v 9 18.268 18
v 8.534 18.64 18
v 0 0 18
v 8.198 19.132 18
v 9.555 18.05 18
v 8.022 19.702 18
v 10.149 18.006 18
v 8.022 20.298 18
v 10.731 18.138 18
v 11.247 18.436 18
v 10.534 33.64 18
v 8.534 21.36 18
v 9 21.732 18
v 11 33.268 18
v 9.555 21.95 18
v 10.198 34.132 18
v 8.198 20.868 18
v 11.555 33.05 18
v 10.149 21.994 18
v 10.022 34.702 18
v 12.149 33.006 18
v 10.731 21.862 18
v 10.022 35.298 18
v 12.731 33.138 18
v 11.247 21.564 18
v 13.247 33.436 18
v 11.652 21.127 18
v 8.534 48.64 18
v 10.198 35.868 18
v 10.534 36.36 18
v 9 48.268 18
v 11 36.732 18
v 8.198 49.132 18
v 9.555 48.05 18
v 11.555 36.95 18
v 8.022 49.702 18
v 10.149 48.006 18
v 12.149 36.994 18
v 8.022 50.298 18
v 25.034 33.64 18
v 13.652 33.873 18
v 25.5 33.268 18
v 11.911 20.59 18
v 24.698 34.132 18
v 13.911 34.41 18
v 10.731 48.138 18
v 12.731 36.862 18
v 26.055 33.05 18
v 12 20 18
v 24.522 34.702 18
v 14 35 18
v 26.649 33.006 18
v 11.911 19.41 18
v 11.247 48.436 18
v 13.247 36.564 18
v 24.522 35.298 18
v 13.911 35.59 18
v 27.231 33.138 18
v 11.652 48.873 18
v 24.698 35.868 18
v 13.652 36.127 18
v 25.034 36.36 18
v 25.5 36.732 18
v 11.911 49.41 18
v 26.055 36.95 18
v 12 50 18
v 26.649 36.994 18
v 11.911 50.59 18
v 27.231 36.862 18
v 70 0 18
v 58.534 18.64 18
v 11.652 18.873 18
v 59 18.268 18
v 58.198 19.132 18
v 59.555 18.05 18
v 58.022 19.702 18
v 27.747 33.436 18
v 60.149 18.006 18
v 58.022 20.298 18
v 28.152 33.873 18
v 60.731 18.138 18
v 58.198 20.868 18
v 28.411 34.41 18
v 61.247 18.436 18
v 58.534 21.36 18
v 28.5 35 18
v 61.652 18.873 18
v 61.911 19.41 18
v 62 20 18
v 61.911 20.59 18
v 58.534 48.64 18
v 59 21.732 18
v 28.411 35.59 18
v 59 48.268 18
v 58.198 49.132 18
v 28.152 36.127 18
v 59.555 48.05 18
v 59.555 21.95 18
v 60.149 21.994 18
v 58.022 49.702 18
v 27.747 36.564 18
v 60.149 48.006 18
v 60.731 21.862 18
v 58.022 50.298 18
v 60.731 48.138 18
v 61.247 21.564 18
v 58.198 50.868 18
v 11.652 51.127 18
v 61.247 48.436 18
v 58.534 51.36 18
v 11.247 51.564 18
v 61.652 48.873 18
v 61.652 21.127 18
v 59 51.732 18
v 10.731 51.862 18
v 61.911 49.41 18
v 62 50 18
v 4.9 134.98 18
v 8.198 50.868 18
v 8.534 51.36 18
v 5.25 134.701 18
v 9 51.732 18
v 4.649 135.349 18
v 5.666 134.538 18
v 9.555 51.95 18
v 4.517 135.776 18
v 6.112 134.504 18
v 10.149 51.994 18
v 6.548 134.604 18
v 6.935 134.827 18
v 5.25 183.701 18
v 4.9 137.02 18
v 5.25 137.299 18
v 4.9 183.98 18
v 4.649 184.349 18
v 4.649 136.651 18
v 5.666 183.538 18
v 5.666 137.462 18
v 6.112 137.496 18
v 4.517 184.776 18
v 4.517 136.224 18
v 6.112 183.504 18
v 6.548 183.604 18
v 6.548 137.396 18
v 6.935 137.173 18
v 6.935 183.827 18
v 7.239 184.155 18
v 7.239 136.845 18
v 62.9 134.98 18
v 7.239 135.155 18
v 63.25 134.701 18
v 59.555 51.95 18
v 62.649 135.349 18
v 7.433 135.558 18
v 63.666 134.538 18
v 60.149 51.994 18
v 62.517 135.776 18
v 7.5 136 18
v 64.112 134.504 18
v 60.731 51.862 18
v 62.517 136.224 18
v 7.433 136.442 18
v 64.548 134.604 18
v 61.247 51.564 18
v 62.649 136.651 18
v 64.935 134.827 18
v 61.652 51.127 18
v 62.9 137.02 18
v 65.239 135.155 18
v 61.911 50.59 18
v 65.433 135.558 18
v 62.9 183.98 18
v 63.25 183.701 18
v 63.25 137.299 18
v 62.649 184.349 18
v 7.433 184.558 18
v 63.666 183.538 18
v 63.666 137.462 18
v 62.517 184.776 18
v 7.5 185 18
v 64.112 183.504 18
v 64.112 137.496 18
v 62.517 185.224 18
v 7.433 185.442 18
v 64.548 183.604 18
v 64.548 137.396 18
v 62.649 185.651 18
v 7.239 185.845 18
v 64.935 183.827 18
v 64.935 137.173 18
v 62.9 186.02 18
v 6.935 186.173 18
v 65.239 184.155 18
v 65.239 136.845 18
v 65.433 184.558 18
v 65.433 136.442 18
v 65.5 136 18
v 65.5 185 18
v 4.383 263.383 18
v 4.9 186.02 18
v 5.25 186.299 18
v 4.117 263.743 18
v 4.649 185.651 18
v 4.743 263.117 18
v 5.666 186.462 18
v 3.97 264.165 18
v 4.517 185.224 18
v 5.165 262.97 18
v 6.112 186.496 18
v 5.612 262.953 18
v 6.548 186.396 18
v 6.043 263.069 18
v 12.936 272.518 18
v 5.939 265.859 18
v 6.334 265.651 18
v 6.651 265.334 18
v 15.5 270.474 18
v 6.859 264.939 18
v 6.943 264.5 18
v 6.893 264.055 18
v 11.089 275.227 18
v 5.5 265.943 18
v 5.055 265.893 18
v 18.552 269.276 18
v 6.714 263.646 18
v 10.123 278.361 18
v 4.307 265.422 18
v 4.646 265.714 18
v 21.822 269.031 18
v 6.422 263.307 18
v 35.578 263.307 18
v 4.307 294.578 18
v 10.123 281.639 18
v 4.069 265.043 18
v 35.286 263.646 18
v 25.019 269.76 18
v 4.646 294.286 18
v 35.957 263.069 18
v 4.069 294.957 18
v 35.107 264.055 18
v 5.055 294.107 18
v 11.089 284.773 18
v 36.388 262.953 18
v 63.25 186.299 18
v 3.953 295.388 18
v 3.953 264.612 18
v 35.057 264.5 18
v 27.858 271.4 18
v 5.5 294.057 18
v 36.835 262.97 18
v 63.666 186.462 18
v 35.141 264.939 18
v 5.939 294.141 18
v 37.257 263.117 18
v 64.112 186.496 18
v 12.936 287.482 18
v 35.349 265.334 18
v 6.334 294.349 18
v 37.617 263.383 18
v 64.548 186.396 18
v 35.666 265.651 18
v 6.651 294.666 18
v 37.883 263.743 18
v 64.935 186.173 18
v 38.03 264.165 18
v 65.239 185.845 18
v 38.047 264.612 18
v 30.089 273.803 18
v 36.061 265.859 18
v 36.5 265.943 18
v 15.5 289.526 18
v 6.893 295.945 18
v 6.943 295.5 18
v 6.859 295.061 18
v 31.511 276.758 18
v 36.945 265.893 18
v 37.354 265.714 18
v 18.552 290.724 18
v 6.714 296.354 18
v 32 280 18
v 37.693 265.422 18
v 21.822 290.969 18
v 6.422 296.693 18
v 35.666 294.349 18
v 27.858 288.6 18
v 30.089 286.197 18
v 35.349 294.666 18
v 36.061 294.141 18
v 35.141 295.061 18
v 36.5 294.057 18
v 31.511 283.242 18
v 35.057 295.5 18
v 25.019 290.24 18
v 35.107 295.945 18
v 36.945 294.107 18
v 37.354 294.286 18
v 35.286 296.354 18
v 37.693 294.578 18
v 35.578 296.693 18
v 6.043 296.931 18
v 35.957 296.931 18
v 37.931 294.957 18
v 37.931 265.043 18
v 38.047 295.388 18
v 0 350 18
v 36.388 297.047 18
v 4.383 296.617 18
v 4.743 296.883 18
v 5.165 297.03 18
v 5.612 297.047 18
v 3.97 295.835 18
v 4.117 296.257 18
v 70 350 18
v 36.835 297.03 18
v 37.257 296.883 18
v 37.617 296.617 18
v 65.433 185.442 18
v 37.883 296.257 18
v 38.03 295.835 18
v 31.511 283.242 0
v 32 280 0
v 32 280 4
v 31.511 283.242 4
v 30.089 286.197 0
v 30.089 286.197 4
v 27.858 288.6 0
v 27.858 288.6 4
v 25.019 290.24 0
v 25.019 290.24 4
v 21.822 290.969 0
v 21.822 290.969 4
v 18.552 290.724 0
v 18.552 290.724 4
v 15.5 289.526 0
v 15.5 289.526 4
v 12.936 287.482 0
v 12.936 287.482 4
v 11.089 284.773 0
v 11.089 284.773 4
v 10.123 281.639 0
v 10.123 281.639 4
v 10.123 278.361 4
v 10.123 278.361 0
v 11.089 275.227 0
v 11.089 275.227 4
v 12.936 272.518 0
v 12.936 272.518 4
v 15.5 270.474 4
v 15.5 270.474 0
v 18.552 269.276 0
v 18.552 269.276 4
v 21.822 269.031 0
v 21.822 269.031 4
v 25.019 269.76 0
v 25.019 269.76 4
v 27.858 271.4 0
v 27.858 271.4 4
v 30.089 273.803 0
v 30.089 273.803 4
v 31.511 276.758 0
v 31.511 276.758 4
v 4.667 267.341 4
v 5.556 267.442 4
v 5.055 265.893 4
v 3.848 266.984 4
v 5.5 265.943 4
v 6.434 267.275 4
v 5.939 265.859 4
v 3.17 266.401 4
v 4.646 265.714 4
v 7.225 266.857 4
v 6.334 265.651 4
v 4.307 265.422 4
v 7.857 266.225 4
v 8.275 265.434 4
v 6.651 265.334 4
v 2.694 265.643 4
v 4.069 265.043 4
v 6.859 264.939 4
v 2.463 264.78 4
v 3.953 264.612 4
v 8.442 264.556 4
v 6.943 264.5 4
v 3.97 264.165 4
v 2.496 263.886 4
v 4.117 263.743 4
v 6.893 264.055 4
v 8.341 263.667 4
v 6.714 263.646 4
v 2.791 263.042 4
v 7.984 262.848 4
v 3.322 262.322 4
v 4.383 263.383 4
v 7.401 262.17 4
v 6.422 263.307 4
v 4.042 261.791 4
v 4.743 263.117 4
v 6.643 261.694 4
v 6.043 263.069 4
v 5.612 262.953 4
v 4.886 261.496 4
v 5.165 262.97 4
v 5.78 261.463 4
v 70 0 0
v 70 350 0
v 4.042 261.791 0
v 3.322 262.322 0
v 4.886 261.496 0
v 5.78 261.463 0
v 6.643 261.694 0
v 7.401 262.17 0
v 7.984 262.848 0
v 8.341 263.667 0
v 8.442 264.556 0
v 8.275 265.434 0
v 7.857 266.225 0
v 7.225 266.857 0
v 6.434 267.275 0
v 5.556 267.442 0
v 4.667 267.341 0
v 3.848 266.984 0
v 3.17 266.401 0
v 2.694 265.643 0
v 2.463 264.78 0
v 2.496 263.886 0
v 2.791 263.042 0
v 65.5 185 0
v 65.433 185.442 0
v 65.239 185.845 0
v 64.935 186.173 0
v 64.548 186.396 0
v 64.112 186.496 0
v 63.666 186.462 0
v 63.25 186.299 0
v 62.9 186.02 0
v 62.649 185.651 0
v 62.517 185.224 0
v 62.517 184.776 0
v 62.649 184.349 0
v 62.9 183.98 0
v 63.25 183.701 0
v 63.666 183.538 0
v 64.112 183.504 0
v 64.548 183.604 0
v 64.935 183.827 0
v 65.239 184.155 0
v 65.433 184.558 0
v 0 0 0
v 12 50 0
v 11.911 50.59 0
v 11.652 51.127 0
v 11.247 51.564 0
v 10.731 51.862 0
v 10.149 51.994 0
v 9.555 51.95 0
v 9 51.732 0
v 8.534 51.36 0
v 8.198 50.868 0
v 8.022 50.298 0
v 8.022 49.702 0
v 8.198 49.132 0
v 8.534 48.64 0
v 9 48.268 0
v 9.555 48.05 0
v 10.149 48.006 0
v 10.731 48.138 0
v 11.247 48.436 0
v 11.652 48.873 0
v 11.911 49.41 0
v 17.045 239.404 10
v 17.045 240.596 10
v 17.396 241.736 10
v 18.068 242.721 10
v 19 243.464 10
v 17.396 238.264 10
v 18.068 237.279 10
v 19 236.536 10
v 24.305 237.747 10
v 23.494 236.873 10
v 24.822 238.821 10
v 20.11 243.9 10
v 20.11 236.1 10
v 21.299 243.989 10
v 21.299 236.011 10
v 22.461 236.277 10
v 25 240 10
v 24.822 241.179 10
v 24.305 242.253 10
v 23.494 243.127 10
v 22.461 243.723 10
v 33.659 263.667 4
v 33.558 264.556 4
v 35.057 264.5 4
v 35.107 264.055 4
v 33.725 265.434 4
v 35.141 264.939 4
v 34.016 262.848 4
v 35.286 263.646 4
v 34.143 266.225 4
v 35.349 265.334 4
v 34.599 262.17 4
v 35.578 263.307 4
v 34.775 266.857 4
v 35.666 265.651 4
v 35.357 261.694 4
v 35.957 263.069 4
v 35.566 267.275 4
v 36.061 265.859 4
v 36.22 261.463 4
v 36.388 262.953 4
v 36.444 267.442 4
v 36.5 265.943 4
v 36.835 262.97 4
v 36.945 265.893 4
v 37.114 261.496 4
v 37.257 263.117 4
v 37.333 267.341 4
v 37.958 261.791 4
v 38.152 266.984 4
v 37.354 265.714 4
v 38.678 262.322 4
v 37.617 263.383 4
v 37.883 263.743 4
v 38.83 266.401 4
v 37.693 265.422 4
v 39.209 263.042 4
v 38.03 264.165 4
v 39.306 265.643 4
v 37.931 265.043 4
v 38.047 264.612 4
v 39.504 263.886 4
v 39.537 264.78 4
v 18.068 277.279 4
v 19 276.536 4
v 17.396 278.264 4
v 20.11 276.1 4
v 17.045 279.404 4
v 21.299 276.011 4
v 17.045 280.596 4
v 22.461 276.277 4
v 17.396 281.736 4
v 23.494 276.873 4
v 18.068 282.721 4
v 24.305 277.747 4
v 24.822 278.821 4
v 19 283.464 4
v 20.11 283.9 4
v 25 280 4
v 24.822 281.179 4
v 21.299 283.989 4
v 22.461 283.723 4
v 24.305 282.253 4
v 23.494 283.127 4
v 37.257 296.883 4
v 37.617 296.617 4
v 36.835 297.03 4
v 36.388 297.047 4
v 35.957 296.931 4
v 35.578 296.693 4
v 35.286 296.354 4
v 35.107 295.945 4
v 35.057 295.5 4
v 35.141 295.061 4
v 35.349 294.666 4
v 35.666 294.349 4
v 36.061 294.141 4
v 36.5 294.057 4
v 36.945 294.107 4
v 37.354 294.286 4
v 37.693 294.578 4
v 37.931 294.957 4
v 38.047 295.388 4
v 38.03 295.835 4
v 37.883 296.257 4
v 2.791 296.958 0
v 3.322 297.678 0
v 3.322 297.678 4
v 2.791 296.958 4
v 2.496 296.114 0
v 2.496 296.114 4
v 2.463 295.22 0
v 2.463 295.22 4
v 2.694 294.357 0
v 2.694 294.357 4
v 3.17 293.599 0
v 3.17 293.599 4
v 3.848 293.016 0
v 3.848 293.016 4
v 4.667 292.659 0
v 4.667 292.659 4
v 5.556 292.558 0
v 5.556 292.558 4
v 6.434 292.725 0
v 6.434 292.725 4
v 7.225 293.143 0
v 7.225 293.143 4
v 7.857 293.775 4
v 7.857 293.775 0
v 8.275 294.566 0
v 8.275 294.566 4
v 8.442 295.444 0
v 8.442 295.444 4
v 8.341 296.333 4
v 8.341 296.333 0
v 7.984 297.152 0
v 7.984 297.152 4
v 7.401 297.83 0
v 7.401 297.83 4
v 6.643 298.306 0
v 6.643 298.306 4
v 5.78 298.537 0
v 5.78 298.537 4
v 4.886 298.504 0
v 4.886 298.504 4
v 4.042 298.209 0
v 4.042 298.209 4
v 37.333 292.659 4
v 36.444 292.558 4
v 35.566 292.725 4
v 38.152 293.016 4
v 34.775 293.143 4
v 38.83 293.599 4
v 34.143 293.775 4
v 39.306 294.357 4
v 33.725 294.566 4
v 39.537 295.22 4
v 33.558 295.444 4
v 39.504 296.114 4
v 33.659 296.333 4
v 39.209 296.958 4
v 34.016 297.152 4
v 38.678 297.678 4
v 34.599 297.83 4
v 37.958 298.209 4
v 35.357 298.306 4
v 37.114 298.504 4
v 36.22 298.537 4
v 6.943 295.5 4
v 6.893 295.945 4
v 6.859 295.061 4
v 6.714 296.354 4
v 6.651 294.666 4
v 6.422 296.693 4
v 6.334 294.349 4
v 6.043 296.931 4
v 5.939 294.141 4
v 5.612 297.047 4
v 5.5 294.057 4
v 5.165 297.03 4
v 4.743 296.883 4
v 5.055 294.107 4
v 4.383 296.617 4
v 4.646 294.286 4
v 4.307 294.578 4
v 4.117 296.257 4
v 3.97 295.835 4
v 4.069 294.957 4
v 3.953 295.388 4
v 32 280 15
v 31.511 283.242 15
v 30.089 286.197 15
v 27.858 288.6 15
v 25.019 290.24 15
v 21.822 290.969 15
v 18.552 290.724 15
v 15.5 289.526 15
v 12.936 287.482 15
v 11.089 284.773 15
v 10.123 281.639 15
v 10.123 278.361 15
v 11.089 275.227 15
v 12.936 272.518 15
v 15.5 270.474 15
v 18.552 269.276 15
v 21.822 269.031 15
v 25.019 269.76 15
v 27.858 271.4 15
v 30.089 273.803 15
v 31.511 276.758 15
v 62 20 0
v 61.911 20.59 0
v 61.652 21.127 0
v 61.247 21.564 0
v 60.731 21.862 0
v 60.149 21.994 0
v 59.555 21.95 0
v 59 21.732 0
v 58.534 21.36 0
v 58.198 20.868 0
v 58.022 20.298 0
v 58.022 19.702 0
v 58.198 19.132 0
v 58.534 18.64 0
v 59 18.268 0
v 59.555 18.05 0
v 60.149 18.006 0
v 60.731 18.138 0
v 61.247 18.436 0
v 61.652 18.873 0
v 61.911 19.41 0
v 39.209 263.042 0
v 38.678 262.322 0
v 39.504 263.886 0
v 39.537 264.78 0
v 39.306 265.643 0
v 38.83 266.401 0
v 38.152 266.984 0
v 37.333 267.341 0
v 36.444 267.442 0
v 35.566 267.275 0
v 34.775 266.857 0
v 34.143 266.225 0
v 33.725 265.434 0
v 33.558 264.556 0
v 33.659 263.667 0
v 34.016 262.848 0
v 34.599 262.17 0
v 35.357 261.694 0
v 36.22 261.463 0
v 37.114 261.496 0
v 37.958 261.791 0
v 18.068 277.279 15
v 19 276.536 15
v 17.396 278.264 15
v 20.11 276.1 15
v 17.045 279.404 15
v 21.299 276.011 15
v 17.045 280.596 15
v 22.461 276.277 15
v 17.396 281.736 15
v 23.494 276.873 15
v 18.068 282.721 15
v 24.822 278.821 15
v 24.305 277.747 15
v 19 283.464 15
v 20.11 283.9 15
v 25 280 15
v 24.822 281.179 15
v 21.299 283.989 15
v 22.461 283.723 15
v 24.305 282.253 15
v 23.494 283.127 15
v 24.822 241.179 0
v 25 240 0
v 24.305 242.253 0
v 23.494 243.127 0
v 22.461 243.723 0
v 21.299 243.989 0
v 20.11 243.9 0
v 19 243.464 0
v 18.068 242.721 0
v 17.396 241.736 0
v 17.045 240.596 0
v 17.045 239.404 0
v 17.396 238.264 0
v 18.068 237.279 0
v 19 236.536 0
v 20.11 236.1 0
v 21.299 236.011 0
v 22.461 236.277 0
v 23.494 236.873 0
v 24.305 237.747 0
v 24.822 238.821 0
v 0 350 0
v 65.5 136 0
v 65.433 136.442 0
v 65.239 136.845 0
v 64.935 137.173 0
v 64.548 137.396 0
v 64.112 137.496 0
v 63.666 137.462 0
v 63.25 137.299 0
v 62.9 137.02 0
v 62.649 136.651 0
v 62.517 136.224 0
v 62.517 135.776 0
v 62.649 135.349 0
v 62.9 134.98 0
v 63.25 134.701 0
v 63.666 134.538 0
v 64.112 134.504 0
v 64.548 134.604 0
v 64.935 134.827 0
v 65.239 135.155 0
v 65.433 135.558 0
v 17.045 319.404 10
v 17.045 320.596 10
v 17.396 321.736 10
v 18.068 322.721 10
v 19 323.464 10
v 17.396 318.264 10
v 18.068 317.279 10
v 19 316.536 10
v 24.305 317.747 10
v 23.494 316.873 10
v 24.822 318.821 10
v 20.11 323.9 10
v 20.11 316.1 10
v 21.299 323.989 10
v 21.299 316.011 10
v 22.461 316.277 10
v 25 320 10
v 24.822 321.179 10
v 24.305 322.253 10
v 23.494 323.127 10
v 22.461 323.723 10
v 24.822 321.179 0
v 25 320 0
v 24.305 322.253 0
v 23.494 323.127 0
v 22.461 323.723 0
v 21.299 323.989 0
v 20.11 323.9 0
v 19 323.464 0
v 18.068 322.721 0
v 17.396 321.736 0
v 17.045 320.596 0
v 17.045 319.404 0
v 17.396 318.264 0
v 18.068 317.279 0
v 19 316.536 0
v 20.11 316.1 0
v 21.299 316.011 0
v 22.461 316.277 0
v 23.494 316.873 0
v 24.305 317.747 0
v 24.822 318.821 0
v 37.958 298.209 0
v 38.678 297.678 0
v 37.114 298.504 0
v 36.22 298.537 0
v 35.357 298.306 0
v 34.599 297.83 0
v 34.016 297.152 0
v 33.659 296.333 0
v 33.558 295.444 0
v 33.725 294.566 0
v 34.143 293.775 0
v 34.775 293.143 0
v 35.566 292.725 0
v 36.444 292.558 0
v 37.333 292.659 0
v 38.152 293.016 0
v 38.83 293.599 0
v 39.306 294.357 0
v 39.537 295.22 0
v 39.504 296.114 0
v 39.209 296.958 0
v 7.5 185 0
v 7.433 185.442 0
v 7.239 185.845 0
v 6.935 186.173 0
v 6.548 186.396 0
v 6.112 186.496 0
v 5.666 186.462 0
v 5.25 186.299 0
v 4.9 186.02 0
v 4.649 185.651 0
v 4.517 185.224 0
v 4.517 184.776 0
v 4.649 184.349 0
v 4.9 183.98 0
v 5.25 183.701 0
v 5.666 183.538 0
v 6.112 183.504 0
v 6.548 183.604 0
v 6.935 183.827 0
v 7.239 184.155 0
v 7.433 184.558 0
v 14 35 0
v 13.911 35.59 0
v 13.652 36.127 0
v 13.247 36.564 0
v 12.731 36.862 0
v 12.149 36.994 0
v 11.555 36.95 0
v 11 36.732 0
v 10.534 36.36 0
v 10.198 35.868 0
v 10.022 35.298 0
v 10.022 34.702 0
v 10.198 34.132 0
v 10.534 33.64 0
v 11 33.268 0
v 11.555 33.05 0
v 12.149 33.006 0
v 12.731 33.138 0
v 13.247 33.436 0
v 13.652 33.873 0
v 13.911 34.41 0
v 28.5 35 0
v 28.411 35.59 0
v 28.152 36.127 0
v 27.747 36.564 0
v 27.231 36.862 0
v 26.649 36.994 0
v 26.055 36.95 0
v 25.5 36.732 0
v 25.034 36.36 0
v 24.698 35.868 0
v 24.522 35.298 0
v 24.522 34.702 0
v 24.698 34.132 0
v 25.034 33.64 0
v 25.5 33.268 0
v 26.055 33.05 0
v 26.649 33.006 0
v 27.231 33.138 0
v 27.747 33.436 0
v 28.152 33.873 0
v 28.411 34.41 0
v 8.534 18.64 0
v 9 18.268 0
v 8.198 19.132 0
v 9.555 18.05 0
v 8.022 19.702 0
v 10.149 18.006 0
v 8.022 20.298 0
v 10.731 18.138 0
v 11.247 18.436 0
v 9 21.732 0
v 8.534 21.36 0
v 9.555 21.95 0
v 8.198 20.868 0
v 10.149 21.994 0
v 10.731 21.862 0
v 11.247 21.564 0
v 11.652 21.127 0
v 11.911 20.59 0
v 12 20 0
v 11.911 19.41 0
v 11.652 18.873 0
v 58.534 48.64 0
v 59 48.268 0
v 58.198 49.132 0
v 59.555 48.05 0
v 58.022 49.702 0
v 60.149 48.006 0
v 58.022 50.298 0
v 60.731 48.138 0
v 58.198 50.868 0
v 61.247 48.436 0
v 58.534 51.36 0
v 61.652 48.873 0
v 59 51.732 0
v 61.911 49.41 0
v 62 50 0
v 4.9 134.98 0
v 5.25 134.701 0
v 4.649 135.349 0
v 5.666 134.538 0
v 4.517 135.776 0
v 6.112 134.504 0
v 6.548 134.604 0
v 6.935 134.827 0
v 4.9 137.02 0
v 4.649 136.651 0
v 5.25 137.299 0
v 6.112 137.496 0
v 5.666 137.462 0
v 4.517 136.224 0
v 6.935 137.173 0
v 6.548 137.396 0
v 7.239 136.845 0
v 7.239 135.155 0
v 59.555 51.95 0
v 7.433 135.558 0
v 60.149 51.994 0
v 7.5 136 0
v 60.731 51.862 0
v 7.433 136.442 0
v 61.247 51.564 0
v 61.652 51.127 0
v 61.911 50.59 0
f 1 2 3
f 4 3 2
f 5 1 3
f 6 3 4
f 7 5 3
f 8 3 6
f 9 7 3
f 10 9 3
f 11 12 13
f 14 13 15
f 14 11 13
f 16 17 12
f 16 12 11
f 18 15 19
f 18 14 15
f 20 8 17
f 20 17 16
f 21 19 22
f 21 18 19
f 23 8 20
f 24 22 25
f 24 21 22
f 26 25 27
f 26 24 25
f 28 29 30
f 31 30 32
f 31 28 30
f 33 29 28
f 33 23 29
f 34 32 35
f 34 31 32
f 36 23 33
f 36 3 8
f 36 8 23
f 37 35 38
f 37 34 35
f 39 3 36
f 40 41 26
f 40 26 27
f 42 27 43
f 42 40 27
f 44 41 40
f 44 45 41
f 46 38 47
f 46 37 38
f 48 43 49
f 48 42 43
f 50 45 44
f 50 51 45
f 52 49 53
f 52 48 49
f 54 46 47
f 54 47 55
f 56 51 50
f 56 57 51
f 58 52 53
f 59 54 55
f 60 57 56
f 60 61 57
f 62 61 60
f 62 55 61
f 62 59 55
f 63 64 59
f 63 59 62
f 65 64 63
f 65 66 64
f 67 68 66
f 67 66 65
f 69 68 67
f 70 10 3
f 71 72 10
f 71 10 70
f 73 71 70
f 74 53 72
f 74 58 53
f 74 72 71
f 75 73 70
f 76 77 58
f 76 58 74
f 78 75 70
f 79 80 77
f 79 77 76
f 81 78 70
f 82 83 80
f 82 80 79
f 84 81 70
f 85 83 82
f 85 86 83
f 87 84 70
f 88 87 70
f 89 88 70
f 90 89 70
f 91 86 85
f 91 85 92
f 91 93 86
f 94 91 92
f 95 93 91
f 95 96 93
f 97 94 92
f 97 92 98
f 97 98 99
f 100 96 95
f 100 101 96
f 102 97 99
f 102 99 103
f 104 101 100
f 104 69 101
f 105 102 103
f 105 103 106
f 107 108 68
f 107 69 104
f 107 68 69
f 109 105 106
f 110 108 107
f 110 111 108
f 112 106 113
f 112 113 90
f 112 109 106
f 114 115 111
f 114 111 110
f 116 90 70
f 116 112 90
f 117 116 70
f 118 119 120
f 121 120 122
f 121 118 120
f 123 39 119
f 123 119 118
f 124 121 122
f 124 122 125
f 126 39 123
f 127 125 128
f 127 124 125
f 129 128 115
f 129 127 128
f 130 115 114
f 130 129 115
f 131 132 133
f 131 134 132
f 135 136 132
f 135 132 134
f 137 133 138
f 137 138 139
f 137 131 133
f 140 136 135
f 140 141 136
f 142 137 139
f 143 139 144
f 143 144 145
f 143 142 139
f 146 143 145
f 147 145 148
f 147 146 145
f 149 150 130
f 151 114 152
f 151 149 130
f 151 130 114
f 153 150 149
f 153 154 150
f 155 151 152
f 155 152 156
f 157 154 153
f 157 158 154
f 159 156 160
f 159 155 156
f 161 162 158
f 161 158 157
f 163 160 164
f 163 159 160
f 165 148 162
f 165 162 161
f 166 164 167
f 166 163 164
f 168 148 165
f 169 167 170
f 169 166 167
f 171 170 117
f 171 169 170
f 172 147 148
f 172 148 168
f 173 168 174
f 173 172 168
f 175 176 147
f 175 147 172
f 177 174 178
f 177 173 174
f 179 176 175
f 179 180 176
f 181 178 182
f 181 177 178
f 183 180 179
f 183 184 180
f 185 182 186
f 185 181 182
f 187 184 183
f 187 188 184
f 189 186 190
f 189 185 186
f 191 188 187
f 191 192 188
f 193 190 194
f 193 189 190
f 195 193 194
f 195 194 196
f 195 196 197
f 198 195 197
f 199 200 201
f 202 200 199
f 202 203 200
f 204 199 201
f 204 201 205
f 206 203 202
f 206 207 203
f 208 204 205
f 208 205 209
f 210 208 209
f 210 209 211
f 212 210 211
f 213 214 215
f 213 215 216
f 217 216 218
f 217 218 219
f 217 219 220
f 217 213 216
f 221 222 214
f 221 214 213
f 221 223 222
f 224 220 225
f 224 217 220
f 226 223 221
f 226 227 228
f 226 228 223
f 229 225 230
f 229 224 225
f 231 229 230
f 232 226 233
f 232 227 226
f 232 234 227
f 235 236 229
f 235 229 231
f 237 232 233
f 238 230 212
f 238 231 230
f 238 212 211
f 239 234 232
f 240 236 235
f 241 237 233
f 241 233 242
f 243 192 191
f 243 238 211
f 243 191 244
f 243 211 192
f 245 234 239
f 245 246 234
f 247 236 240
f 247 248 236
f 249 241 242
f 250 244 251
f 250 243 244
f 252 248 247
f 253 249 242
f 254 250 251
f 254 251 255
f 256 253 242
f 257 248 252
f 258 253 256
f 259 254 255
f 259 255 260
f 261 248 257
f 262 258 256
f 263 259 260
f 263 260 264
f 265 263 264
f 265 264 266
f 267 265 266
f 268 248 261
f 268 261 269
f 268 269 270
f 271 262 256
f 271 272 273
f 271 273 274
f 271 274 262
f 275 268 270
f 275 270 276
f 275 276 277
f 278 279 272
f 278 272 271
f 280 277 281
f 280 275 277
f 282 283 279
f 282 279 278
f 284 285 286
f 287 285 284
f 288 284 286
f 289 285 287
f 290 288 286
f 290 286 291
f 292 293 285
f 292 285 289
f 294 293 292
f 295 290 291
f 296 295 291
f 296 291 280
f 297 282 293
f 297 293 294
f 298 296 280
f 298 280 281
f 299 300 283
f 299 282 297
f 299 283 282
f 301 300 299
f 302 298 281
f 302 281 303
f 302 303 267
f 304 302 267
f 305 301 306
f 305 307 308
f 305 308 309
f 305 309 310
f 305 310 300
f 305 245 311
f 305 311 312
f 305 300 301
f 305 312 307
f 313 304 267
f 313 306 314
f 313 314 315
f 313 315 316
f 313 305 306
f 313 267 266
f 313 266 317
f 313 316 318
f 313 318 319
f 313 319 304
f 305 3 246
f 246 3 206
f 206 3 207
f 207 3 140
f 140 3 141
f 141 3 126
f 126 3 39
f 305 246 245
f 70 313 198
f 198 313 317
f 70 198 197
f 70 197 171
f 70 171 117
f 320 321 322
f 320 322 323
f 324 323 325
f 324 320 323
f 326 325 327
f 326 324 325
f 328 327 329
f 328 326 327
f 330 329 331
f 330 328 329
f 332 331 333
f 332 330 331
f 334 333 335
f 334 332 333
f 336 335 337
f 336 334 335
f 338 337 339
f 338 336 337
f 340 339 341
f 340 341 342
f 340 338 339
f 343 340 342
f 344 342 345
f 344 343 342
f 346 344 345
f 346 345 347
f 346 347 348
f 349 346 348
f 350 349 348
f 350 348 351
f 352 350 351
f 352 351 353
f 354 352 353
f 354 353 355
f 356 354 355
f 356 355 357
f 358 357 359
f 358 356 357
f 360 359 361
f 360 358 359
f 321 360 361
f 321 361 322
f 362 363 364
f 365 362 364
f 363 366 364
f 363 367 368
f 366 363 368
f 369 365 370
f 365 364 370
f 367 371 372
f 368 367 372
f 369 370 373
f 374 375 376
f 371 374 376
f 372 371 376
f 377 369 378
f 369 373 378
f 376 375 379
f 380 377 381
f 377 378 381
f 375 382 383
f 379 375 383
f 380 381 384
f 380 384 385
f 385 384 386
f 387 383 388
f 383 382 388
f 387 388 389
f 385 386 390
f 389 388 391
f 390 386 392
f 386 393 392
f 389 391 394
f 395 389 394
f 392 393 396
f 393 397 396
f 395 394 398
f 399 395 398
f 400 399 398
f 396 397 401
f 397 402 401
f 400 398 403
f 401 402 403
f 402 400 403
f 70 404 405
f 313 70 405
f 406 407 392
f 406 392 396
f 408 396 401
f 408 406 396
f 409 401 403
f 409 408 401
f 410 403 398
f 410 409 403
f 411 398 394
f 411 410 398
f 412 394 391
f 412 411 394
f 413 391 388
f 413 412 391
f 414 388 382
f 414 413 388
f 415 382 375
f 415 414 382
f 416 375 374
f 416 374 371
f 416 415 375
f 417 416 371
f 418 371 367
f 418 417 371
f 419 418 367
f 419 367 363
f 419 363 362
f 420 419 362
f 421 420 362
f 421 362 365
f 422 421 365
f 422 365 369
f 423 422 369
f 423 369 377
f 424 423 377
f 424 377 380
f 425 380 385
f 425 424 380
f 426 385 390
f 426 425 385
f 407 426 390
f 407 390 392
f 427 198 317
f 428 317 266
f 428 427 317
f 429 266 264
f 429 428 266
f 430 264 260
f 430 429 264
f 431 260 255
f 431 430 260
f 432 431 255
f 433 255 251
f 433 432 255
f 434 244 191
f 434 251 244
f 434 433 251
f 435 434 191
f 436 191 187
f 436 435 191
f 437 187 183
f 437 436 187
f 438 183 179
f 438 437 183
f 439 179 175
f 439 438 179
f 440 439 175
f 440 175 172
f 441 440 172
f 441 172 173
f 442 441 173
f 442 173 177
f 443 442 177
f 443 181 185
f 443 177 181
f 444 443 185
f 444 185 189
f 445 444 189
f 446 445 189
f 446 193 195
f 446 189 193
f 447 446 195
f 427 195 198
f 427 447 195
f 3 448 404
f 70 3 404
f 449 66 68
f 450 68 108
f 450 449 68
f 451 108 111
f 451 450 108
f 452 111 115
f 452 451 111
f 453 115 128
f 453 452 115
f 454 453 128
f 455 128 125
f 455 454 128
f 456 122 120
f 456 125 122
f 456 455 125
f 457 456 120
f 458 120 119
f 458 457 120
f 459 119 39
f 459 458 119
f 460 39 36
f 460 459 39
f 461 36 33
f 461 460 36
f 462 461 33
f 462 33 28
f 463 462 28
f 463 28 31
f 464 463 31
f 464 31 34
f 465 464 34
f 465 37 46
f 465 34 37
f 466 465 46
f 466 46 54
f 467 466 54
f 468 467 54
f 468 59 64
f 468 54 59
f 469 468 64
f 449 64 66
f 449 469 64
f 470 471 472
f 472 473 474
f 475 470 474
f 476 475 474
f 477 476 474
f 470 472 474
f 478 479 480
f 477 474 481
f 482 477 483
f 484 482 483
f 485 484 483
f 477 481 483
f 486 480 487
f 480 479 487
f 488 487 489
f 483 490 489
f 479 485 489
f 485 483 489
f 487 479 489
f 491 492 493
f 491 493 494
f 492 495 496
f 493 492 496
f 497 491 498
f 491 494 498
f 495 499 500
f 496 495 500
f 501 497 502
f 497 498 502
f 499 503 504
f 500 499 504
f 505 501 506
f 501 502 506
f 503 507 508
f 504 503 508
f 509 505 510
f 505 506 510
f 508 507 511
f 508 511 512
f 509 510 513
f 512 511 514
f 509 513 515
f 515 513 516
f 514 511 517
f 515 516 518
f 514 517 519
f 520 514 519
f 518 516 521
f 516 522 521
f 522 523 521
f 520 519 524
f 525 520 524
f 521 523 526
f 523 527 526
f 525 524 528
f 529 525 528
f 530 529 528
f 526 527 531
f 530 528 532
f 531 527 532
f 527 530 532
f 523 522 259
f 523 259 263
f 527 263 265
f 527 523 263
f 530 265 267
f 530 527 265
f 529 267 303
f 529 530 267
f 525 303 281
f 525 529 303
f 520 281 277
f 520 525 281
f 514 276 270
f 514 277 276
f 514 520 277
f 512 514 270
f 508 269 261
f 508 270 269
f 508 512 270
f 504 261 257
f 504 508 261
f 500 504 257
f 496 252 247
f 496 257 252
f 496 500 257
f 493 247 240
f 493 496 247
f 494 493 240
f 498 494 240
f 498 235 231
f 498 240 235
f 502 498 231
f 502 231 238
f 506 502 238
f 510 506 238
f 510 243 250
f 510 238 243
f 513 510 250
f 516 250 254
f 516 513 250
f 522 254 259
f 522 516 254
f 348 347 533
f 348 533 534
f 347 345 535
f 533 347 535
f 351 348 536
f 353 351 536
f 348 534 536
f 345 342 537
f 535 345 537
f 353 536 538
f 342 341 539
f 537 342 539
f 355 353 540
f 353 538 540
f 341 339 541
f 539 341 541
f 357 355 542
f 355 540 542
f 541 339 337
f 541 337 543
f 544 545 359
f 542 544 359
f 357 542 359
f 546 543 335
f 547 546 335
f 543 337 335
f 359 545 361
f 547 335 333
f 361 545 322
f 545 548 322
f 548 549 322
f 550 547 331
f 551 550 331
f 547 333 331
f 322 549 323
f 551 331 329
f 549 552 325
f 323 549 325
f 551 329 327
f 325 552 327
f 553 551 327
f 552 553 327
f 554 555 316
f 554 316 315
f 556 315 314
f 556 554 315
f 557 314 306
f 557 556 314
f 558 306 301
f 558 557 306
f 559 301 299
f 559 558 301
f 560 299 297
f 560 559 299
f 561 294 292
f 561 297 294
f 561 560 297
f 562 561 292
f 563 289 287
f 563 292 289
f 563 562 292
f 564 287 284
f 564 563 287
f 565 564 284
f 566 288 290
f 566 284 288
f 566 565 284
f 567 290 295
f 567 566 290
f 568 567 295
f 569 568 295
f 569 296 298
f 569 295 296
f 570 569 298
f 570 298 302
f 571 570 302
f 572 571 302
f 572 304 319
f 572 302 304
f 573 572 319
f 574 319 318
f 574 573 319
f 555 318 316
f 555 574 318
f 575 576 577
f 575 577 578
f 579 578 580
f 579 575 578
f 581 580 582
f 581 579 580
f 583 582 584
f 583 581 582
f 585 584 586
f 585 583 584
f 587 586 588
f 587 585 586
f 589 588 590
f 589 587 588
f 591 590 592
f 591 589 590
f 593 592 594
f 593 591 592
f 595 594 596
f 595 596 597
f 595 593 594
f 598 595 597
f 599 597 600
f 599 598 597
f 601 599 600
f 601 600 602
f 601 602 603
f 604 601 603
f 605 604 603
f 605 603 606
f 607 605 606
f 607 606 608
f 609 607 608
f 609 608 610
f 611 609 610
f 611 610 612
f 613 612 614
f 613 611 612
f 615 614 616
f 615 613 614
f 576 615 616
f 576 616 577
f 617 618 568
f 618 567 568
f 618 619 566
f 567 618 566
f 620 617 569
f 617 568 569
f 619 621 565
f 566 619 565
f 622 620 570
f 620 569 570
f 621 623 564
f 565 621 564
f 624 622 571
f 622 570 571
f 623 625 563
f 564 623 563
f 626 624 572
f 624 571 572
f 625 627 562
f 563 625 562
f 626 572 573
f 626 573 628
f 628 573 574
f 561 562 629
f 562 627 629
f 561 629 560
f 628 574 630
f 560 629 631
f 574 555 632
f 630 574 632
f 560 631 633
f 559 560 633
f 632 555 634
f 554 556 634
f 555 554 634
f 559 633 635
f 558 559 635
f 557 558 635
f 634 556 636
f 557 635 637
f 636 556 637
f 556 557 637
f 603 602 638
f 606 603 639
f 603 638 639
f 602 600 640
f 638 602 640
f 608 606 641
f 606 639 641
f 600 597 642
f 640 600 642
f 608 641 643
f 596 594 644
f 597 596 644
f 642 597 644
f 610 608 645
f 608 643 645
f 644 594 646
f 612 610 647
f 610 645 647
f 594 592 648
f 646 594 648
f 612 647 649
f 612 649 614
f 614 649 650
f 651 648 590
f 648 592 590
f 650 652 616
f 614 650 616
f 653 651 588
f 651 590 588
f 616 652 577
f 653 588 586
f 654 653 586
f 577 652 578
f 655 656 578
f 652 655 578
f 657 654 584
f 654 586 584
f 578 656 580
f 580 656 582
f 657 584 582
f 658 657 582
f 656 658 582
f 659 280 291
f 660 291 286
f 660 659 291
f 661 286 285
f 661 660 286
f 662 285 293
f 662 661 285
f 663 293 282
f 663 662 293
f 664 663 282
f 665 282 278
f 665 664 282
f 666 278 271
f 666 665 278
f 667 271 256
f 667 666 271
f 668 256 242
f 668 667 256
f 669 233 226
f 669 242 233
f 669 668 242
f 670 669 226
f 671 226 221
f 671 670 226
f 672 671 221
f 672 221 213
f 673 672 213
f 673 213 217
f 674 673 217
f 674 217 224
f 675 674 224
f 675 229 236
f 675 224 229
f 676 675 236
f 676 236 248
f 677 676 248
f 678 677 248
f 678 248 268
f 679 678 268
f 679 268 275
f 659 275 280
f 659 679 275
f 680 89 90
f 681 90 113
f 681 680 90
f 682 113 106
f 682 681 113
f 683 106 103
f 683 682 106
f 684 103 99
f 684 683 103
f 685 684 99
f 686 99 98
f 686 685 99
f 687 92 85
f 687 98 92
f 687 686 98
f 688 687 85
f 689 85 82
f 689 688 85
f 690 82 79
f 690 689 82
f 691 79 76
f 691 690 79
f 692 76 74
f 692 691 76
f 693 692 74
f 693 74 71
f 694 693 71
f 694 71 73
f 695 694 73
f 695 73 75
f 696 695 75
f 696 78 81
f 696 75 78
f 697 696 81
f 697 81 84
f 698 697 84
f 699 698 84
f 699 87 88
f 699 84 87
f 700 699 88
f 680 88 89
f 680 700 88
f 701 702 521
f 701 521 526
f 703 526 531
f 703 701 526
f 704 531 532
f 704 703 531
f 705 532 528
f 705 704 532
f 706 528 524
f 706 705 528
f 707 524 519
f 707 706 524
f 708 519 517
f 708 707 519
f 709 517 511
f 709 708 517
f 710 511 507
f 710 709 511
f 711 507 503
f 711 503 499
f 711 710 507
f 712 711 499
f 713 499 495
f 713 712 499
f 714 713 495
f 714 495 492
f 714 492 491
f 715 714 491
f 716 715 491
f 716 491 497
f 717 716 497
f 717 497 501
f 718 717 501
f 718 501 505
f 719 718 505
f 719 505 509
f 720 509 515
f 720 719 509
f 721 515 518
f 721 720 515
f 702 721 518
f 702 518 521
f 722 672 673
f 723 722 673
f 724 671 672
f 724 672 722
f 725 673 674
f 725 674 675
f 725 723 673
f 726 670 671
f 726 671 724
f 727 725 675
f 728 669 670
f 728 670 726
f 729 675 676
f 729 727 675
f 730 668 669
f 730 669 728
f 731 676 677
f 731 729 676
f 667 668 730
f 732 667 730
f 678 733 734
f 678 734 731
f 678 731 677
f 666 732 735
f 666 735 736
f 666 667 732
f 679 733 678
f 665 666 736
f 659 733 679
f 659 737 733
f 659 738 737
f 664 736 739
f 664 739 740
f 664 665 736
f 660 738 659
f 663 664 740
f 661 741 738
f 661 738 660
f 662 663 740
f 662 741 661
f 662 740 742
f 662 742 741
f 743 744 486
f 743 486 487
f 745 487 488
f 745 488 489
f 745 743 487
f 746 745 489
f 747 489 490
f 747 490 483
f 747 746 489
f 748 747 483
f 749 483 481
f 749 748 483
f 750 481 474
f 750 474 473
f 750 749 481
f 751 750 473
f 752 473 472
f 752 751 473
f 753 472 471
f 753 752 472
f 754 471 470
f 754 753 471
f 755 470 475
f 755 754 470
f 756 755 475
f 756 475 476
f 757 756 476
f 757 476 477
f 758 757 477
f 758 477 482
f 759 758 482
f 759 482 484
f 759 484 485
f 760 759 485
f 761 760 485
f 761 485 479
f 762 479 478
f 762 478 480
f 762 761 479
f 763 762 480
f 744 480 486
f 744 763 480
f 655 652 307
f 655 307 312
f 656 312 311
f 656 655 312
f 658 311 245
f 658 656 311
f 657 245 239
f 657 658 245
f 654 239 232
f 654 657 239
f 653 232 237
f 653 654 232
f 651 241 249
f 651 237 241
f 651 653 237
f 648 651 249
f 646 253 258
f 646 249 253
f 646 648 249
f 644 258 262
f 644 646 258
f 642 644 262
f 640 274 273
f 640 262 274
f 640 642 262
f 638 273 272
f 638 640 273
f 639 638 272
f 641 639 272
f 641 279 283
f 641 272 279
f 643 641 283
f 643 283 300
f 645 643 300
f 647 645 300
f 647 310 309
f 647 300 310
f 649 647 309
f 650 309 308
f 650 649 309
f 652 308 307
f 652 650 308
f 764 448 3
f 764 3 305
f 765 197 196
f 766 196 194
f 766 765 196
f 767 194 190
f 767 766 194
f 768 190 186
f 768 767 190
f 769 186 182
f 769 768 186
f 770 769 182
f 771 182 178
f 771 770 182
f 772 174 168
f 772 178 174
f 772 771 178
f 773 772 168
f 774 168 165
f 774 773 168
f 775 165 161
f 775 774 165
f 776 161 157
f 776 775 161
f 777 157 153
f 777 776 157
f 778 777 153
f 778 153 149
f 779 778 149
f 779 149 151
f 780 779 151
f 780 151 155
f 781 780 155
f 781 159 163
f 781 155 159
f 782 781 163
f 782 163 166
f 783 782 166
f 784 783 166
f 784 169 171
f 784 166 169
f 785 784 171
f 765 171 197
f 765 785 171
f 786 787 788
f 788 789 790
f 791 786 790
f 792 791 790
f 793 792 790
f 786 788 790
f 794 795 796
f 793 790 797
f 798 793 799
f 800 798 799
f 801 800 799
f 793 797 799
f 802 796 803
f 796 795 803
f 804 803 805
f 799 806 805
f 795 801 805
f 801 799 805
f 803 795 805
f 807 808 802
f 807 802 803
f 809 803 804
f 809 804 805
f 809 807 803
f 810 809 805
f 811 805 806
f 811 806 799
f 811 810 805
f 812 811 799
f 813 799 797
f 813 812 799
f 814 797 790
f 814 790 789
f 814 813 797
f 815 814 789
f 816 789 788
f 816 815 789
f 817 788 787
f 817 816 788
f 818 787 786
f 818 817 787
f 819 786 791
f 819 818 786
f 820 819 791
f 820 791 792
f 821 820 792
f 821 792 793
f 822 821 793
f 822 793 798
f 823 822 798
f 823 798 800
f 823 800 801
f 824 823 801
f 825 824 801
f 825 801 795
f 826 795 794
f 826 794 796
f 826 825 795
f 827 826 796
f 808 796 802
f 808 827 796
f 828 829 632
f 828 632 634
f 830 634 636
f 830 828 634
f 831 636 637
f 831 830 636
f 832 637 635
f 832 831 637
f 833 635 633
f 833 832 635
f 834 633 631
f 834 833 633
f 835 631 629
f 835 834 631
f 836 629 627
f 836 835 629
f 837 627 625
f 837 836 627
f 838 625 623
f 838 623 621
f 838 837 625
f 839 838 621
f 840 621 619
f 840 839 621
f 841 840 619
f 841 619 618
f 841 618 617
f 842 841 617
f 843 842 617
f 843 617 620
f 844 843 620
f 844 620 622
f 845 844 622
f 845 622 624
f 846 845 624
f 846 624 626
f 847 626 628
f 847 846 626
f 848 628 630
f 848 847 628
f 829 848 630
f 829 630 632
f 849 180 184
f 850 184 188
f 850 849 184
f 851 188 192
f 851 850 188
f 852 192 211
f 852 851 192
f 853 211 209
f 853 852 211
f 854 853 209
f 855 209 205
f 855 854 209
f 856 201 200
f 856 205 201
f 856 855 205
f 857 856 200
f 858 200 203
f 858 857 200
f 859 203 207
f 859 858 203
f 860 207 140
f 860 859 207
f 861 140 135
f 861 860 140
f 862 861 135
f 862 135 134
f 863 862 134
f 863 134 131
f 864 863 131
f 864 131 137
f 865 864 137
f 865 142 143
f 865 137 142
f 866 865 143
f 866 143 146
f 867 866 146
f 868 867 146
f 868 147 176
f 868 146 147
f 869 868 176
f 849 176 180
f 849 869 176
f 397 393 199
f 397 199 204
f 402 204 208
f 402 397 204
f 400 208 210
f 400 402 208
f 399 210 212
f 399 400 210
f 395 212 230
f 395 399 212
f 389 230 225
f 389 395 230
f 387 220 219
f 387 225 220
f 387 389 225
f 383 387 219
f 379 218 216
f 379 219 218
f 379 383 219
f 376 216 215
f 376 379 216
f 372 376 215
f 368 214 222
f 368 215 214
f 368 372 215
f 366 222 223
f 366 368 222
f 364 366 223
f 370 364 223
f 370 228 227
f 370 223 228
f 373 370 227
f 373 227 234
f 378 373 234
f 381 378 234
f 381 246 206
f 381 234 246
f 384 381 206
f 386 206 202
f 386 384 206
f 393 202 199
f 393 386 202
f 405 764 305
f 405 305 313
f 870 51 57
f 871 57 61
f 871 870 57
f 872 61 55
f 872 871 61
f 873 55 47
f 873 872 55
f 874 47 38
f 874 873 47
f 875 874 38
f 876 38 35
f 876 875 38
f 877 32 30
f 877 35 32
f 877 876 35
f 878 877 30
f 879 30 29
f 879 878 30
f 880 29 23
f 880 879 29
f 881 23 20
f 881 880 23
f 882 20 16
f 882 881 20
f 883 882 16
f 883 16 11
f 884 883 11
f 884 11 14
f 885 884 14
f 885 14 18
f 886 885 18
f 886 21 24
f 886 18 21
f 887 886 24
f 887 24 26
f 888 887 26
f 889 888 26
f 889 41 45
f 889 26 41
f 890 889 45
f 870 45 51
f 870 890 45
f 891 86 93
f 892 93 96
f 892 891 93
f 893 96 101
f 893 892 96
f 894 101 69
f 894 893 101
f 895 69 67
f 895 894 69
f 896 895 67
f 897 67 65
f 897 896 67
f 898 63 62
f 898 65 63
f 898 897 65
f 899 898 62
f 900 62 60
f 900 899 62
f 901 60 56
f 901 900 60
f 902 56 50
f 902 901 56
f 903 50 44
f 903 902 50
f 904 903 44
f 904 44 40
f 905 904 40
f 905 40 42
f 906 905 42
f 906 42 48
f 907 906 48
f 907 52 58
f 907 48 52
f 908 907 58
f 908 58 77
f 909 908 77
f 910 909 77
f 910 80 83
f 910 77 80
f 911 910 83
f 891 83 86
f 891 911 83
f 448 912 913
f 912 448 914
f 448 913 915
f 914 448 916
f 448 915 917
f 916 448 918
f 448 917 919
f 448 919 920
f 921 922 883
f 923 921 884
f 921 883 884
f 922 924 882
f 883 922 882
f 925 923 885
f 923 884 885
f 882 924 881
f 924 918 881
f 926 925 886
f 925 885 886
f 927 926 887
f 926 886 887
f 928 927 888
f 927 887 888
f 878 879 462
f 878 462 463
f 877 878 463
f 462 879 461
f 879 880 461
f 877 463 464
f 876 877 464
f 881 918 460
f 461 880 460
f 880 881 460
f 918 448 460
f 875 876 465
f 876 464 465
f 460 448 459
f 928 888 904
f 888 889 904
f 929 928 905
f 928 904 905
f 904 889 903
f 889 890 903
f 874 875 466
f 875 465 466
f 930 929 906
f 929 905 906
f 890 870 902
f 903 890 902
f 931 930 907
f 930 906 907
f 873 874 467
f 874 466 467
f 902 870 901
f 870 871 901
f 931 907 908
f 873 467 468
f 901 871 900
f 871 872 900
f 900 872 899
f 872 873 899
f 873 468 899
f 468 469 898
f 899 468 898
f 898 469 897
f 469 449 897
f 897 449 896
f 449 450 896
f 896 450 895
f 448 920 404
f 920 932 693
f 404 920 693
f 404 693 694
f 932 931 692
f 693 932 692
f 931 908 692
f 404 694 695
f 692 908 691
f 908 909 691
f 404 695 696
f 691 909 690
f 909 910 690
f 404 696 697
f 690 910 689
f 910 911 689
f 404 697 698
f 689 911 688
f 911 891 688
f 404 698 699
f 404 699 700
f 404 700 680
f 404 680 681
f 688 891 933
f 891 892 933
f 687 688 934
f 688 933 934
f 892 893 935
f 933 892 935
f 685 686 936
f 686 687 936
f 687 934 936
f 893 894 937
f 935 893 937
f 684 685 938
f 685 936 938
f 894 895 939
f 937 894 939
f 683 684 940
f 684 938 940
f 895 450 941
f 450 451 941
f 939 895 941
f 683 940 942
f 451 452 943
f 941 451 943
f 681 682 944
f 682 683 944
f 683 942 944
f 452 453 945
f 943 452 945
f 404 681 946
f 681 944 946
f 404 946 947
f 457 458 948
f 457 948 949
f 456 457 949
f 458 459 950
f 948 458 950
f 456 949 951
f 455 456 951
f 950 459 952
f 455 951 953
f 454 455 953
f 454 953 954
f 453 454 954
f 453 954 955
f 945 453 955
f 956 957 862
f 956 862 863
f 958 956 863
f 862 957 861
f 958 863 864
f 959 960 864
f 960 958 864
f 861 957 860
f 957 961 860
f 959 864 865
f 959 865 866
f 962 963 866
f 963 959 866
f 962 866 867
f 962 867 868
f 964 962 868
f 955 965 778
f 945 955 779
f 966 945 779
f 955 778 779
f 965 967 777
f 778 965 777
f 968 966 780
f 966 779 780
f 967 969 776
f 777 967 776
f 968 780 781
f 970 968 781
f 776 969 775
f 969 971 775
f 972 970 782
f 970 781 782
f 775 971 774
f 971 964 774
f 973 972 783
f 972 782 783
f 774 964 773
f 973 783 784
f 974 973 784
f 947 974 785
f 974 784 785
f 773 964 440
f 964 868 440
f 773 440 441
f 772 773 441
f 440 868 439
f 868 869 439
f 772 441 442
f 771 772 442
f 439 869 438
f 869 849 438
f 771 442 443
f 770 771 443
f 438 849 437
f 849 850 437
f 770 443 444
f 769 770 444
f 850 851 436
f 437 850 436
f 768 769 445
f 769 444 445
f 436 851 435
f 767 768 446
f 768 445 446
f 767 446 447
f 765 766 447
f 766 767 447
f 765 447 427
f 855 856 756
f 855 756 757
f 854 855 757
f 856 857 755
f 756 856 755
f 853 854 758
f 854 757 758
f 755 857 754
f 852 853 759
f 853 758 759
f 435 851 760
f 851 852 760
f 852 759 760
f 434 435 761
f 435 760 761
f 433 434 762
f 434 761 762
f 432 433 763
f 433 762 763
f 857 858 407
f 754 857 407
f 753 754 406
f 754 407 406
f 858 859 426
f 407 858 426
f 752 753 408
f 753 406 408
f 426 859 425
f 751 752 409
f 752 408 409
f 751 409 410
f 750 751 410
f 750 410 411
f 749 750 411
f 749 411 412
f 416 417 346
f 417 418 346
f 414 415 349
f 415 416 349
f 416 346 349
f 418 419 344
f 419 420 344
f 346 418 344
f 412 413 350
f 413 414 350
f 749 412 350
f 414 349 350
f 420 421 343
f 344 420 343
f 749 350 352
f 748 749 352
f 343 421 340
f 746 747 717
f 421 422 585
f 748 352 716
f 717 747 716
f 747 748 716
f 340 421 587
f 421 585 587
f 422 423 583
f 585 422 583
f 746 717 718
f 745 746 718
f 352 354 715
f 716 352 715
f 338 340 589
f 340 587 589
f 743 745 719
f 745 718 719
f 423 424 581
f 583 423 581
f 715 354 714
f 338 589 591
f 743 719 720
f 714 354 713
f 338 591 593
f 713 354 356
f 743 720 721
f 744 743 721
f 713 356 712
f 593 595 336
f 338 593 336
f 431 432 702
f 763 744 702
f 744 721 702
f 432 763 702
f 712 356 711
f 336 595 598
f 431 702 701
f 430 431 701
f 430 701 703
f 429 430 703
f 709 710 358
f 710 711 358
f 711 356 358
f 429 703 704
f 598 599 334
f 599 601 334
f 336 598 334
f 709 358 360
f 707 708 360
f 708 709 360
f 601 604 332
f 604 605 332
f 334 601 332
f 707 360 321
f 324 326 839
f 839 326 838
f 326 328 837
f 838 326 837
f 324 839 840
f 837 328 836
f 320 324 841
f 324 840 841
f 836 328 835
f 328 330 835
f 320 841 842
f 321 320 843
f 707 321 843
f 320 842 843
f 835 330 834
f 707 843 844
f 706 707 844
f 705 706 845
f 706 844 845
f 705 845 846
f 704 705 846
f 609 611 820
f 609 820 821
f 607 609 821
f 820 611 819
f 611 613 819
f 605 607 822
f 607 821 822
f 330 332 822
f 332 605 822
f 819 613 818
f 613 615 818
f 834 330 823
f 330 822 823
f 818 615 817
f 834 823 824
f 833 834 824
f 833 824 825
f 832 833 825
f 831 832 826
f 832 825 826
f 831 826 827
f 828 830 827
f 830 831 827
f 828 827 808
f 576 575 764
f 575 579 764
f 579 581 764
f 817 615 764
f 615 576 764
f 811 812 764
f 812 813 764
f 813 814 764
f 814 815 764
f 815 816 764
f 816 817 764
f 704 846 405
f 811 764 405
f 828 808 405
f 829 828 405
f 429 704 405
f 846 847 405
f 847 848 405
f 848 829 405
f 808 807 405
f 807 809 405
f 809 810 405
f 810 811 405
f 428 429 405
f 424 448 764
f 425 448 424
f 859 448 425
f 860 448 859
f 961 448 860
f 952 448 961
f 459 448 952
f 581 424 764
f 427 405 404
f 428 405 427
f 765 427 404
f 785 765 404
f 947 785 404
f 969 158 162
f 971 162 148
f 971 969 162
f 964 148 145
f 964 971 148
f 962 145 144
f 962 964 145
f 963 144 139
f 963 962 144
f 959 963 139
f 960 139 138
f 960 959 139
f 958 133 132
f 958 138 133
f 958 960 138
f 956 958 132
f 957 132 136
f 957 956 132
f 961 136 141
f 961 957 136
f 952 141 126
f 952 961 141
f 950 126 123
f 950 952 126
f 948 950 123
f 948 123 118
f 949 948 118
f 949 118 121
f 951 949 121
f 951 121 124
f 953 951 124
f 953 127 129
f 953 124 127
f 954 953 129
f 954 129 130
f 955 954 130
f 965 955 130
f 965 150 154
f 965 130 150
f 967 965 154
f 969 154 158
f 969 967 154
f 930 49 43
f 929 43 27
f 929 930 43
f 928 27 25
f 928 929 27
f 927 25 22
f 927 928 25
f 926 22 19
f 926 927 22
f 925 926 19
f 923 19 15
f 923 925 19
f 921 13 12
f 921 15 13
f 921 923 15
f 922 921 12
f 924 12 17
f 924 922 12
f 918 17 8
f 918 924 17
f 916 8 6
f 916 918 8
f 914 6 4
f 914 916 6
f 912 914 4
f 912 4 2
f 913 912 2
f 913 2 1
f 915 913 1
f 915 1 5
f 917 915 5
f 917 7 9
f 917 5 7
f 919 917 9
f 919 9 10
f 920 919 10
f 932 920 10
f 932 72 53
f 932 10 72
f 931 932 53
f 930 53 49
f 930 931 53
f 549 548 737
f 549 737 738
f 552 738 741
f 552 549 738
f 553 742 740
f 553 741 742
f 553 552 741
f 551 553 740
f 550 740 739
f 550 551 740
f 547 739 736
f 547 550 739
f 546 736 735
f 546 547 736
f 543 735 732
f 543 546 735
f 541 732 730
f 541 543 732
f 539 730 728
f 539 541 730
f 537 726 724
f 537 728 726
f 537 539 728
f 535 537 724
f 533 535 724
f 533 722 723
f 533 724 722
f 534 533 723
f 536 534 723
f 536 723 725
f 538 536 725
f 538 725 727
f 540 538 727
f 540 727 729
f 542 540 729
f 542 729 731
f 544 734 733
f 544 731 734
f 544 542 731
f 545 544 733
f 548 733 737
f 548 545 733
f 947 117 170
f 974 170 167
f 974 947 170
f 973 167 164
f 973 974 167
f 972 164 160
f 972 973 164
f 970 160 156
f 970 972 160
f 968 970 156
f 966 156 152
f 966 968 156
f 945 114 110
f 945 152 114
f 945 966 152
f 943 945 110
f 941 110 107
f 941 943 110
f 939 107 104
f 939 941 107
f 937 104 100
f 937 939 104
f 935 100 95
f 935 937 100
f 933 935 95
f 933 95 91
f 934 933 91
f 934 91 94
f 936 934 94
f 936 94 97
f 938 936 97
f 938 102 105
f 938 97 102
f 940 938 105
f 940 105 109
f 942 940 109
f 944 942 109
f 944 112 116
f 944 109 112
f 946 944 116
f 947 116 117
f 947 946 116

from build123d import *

# Parameters (mm, degrees)
CYLINDER015_R            = 3
CYLINDER015_DEPTH        = 4
ARRAY002_COUNT           = 4
ARRAY002_PLACEMENT_ANGLE = 45
CYLINDER014_R            = 4
CYLINDER014_DEPTH        = 10
ARRAY001_Y_COUNT         = 2
ARRAY001_Y_PITCH         = 80
CYLINDER011_R            = 4
CYLINDER011_DEPTH        = 25
CYLINDER012_R            = 11
CYLINDER012_DEPTH        = 10
CYLINDER013_R            = 11
CYLINDER013_DEPTH        = 4
CYLINDER010_R            = 1.5
CYLINDER010_DEPTH        = 25
ARRAY_COUNT              = 4
ARRAY_PLACEMENT_ANGLE    = 45
CYLINDER008_R            = 1.5
CYLINDER008_DEPTH        = 25
CYLINDER007_R            = 1.5
CYLINDER007_DEPTH        = 25
CYLINDER006_R            = 1.5
CYLINDER006_DEPTH        = 25
CYLINDER009_R            = 1.5
CYLINDER009_DEPTH        = 25
CYLINDER003_R            = 2
CYLINDER003_DEPTH        = 25
CYLINDER004_R            = 2
CYLINDER004_DEPTH        = 25
CYLINDER002_R            = 2
CYLINDER002_DEPTH        = 25
CYLINDER001_R            = 2
CYLINDER001_DEPTH        = 25
CYLINDER_R               = 2
CYLINDER_DEPTH           = 25
CYLINDER005_R            = 2
CYLINDER005_DEPTH        = 25
BOX_W                    = 70
BOX_H                    = 350
BOX_DEPTH                = 18


with BuildPart() as array002:
    # Cylinder015 → Cylinder015 (new body)
    with BuildSketch(Plane(origin=(22, 0, 0), x_dir=(1, 0, 0), z_dir=(0, 0, 1))):
        Circle(CYLINDER015_R)
    extrude(amount=CYLINDER015_DEPTH)

    # Array002: Array002 ×4 about axis
    array002_axis = Axis((0, 0, 0), (0, 0, 1))


with BuildPart() as array002_1:
    add(array002.part)
    for i in range(1, ARRAY002_COUNT):
        add(array002.part.rotate(array002_axis, i * 360 / ARRAY002_COUNT))


with BuildPart() as array002_2:
    # Array002 placement: moved
    add(array002_1.part.moved(Location((21, 280, 0))).rotate(Axis((21, 280, 0), (0, 0, 1)), ARRAY002_PLACEMENT_ANGLE))


with BuildPart() as array001:
    # Cylinder014 → Cylinder014 (new body)
    with BuildSketch(Plane.XY):
        Circle(CYLINDER014_R)
    extrude(amount=CYLINDER014_DEPTH)

    # Array001 Y: Array001 ×2


with BuildPart() as array001_1:
    add(array001.part)
    with Locations(*[(0, i * ARRAY001_Y_PITCH, 0) for i in range(1, ARRAY001_Y_COUNT)]):
        add(array001.part)


with BuildPart() as array001_2:
    # Array001 placement: moved
    add(array001_1.part.moved(Location((21, 240, 0))))


with BuildPart() as cilindro011:
    # Cylinder011 → Cylinder011 (new body)
    with BuildSketch(Plane.XY):
        Circle(CYLINDER011_R)
    extrude(amount=CYLINDER011_DEPTH)


with BuildPart() as cilindro012:
    # Cylinder012 → Cylinder012 (new body)
    with BuildSketch(Plane.XY.offset(15)):
        Circle(CYLINDER012_R)
    extrude(amount=CYLINDER012_DEPTH)


with BuildPart() as fusion002:
    # Cylinder013 → Cylinder013 (new body)
    with BuildSketch(Plane.XY):
        Circle(CYLINDER013_R)
    extrude(amount=CYLINDER013_DEPTH)

    # Fusion002: union Cilindro011, Cilindro012
    add(cilindro011.part)
    add(cilindro012.part)


with BuildPart() as fusion002_1:
    # Fusion002 placement: moved
    add(fusion002.part.moved(Location((21, 280, 0))))


with BuildPart() as array:
    # Cylinder010 → Cylinder010 (new body)
    with BuildSketch(Plane(origin=(22, 0, 0), x_dir=(1, 0, 0), z_dir=(0, 0, 1))):
        Circle(CYLINDER010_R)
    extrude(amount=CYLINDER010_DEPTH)

    # Array: Array ×4 about axis
    array_axis = Axis((0, 0, 0), (0, 0, 1))


with BuildPart() as array_1:
    add(array.part)
    for i in range(1, ARRAY_COUNT):
        add(array.part.rotate(array_axis, i * 360 / ARRAY_COUNT))


with BuildPart() as array_2:
    # Array placement: moved
    add(array_1.part.moved(Location((21, 280, 0))).rotate(Axis((21, 280, 0), (0, 0, 1)), ARRAY_PLACEMENT_ANGLE))


with BuildPart() as cilindro008:
    # Cylinder008 → Cylinder008 (new body)
    with BuildSketch(Plane(origin=(6, 185, 0), x_dir=(1, 0, 0), z_dir=(0, 0, 1))):
        Circle(CYLINDER008_R)
    extrude(amount=CYLINDER008_DEPTH)


with BuildPart() as cilindro007:
    # Cylinder007 → Cylinder007 (new body)
    with BuildSketch(Plane(origin=(6, 136, 0), x_dir=(1, 0, 0), z_dir=(0, 0, 1))):
        Circle(CYLINDER007_R)
    extrude(amount=CYLINDER007_DEPTH)


with BuildPart() as cilindro006:
    # Cylinder006 → Cylinder006 (new body)
    with BuildSketch(Plane(origin=(64, 136, 0), x_dir=(1, 0, 0), z_dir=(0, 0, 1))):
        Circle(CYLINDER006_R)
    extrude(amount=CYLINDER006_DEPTH)


with BuildPart() as fusion001:
    # Cylinder009 → Cylinder009 (new body)
    with BuildSketch(Plane(origin=(64, 185, 0), x_dir=(1, 0, 0), z_dir=(0, 0, 1))):
        Circle(CYLINDER009_R)
    extrude(amount=CYLINDER009_DEPTH)

    # Fusion001: union Cilindro008, Cilindro007, Cilindro006
    add(cilindro008.part)
    add(cilindro007.part)
    add(cilindro006.part)


with BuildPart() as cilindro003:
    # Cylinder003 → Cylinder003 (new body)
    with BuildSketch(Plane(origin=(60, 50, 0), x_dir=(1, 0, 0), z_dir=(0, 0, 1))):
        Circle(CYLINDER003_R)
    extrude(amount=CYLINDER003_DEPTH)


with BuildPart() as cilindro004:
    # Cylinder004 → Cylinder004 (new body)
    with BuildSketch(Plane(origin=(12, 35, 0), x_dir=(1, 0, 0), z_dir=(0, 0, 1))):
        Circle(CYLINDER004_R)
    extrude(amount=CYLINDER004_DEPTH)


with BuildPart() as cilindro002:
    # Cylinder002 → Cylinder002 (new body)
    with BuildSketch(Plane(origin=(10, 50, 0), x_dir=(1, 0, 0), z_dir=(0, 0, 1))):
        Circle(CYLINDER002_R)
    extrude(amount=CYLINDER002_DEPTH)


with BuildPart() as cilindro001:
    # Cylinder001 → Cylinder001 (new body)
    with BuildSketch(Plane(origin=(60, 20, 0), x_dir=(1, 0, 0), z_dir=(0, 0, 1))):
        Circle(CYLINDER001_R)
    extrude(amount=CYLINDER001_DEPTH)


with BuildPart() as cilindro:
    # Cylinder → Cylinder (new body)
    with BuildSketch(Plane(origin=(10, 20, 0), x_dir=(1, 0, 0), z_dir=(0, 0, 1))):
        Circle(CYLINDER_R)
    extrude(amount=CYLINDER_DEPTH)


with BuildPart() as fusion:
    # Cylinder005 → Cylinder005 (new body)
    with BuildSketch(Plane(origin=(26.5, 35, 0), x_dir=(1, 0, 0), z_dir=(0, 0, 1))):
        Circle(CYLINDER005_R)
    extrude(amount=CYLINDER005_DEPTH)

    # Fusion: union Cilindro003, Cilindro004, Cilindro002, Cilindro001, Cilindro
    add(cilindro003.part)
    add(cilindro004.part)
    add(cilindro002.part)
    add(cilindro001.part)
    add(cilindro.part)


with BuildPart() as cut005:
    # Box → Box (new body)
    with BuildSketch(Plane.XY):
        with Locations((35, 175)):
            Rectangle(BOX_W, BOX_H)
    extrude(amount=BOX_DEPTH)

    # Cut: cut Fusion
    add(fusion.part, mode=Mode.SUBTRACT)

    # Cut001: cut Fusion001
    add(fusion001.part, mode=Mode.SUBTRACT)

    # Cut002: cut Array
    add(array_2.part, mode=Mode.SUBTRACT)

    # Cut003: cut Fusion002
    add(fusion002_1.part, mode=Mode.SUBTRACT)

    # Cut004: cut Array001
    add(array001_2.part, mode=Mode.SUBTRACT)

    # Cut005: cut Array002
    add(array002_2.part, mode=Mode.SUBTRACT)


solid = cut005.part
